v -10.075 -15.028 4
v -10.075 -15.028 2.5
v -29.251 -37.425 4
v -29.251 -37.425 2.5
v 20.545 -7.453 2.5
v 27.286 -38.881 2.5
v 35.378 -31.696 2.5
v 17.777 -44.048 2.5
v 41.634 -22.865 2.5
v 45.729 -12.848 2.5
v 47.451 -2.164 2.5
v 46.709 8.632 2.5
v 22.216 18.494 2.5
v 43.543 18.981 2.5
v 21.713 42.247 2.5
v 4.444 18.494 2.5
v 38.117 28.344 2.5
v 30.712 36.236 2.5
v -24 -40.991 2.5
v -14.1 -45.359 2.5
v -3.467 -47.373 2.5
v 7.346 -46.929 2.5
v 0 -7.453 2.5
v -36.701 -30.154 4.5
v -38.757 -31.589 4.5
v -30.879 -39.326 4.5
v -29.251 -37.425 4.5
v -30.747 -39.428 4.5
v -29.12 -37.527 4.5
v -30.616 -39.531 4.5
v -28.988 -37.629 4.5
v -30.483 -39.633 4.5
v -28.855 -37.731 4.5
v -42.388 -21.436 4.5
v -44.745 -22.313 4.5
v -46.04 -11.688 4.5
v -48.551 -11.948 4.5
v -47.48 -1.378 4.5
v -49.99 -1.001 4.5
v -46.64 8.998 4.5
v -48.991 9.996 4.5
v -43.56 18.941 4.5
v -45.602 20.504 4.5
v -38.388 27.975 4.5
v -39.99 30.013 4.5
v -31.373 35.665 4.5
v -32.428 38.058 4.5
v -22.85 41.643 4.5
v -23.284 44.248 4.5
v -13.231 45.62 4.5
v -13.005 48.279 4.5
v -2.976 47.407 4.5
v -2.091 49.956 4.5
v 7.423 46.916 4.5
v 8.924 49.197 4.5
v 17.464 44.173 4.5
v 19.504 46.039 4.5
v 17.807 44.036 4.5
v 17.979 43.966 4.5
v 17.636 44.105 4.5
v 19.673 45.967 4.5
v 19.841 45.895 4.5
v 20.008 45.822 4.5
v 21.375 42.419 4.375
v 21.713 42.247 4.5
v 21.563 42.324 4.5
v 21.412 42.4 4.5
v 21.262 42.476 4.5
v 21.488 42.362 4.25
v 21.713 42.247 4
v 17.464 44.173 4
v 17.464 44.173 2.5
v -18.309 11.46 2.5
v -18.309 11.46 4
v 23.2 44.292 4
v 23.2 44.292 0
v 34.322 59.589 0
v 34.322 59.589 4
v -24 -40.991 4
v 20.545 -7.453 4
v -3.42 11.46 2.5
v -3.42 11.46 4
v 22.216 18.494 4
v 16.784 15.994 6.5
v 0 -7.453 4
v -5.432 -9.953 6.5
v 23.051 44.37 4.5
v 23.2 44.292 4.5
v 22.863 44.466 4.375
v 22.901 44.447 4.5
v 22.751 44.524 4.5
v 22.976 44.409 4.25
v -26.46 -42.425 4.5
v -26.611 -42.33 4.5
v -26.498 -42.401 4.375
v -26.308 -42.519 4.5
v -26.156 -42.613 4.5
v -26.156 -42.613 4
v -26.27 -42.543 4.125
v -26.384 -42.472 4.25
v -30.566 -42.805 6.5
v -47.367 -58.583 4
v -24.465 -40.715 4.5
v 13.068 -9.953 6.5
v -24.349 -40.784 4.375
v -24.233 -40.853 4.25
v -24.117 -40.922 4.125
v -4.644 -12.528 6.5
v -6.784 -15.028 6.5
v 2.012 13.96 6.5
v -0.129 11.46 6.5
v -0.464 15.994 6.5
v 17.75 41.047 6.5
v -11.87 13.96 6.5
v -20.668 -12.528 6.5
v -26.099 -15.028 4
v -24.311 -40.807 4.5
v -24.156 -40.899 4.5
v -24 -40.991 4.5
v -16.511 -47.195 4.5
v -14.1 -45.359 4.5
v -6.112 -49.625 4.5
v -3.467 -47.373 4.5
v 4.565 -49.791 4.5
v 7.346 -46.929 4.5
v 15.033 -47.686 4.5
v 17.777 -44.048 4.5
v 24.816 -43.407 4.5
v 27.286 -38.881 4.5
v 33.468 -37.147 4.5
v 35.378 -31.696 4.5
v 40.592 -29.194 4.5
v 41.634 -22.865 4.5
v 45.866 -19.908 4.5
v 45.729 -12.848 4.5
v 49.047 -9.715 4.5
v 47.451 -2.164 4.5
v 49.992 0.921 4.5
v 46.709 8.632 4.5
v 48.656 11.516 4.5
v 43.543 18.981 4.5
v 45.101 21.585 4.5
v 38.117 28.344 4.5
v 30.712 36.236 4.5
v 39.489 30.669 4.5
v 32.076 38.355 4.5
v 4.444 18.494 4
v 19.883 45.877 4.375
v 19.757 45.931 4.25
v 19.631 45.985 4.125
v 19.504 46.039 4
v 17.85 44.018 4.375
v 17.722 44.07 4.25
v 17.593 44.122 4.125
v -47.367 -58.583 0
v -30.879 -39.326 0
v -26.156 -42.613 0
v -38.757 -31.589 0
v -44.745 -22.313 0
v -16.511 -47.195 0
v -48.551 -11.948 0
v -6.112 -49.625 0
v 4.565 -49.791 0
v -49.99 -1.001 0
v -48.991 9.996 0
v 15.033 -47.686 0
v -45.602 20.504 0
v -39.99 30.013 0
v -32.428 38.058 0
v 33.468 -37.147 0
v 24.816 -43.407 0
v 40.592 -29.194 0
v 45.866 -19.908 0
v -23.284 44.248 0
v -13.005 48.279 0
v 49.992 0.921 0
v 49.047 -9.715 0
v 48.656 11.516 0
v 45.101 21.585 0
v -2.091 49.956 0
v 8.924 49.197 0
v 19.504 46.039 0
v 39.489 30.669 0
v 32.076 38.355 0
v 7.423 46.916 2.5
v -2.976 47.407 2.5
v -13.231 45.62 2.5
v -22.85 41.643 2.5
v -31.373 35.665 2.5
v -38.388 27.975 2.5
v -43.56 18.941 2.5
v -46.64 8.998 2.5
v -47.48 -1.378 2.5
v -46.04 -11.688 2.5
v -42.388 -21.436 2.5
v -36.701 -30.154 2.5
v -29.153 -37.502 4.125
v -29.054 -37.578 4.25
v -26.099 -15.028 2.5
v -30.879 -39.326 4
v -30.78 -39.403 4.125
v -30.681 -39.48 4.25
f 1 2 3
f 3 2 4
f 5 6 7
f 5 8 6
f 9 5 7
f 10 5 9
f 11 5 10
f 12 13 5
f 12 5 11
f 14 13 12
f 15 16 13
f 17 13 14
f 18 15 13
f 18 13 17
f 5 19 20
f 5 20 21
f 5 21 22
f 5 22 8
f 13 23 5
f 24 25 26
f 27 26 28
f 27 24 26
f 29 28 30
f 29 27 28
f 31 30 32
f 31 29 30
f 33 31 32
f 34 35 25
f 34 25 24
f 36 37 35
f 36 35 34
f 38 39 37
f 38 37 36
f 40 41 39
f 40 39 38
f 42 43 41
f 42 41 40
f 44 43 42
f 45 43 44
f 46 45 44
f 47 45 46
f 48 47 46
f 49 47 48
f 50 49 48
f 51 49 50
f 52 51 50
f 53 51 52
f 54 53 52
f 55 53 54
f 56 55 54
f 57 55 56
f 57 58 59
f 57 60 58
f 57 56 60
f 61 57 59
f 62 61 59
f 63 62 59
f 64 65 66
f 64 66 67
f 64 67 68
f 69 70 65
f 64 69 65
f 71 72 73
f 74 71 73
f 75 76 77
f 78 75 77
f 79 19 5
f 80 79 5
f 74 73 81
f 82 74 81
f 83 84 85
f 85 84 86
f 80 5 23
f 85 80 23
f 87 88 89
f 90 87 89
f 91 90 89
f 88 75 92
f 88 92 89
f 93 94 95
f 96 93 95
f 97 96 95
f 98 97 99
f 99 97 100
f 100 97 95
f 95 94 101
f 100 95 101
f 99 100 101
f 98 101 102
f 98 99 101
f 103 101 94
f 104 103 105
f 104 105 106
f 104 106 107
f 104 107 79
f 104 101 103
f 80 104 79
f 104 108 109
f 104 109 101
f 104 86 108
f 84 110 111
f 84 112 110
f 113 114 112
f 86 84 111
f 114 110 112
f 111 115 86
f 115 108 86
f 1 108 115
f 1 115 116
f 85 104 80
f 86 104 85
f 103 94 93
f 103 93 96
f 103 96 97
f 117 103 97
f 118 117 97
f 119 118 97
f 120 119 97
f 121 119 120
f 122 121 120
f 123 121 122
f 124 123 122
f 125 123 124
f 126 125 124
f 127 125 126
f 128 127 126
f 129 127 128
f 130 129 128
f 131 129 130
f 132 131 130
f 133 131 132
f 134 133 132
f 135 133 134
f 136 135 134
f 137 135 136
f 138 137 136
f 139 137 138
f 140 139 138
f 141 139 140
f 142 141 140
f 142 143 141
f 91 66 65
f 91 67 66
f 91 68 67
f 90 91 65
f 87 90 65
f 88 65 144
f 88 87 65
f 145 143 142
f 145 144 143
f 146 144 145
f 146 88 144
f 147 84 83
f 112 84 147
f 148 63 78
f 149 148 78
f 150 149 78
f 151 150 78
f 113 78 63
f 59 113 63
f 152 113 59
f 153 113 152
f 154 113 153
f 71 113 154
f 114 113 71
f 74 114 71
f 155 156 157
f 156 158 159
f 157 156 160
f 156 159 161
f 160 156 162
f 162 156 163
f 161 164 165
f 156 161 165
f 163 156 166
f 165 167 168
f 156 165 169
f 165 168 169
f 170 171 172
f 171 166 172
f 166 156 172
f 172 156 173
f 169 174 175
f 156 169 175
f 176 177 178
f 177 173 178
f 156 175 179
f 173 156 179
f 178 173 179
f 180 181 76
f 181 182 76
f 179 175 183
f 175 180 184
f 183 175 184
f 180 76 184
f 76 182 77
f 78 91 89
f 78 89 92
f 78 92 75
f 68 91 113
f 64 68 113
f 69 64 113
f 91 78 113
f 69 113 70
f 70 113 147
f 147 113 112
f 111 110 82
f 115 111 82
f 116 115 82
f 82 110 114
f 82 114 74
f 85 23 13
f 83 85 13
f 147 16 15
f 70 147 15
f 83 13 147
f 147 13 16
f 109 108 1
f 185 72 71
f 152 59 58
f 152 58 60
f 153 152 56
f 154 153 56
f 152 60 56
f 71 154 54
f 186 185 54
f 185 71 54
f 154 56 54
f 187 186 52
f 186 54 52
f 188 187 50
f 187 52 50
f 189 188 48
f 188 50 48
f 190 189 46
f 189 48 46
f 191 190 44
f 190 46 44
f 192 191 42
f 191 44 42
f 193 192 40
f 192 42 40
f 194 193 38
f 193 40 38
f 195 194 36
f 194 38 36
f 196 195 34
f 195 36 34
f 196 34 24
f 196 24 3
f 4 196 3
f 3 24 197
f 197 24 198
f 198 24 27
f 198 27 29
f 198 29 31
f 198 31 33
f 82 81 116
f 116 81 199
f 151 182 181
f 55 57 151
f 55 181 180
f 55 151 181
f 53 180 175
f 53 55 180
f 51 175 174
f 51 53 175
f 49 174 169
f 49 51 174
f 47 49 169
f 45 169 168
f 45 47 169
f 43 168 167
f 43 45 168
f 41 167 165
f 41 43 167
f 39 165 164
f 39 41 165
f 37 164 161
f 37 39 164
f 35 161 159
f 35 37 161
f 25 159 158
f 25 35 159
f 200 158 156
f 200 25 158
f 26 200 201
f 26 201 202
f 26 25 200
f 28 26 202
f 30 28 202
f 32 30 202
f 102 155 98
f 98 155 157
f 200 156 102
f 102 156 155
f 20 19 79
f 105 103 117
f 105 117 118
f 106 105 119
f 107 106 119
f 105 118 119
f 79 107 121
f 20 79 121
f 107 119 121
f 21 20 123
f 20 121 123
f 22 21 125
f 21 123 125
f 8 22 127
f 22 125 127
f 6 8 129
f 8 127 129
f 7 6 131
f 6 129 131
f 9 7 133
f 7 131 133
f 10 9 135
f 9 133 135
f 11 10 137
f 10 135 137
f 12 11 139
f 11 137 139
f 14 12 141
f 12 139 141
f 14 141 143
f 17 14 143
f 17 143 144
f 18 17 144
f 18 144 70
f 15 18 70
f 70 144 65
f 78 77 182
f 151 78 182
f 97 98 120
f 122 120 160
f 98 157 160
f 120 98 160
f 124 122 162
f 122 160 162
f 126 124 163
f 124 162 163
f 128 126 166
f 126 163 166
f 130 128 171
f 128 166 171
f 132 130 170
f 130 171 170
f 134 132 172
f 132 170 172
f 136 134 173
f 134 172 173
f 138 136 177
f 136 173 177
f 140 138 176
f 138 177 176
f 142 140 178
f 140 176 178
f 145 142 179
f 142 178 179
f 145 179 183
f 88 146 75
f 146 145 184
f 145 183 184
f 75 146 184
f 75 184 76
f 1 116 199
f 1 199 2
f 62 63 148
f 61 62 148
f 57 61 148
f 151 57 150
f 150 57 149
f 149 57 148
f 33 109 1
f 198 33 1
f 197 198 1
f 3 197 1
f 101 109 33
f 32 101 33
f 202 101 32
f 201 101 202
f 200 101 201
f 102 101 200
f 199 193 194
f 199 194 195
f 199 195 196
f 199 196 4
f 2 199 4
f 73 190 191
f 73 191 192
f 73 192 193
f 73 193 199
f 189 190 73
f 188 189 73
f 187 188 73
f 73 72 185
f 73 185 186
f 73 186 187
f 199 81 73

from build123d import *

# Parameters (mm, degrees)
F0_R          = 47.5
F1_DEPTH      = 2.5
F0_R_2        = 50
F2_DEPTH      = 4.5
F4_DEPTH      = 2.5
F5_DEPTH      = 2.5
F6_DEPTH      = 2.5
F7_DEPTH      = 2.5
F8_DEPTH      = 2.5
F9_DEPTH      = 1.5
F10_T4_DEPTH  = 97.8665217368
F10_S5_R      = 47.5
F10_T6_DEPTH  = 52
F10_T11_DEPTH = 97.8665217368
F10_S12_R     = 47.5
F10_T13_DEPTH = 52
F10_T18_DEPTH = 97.8665217368
F10_S19_R     = 47.5
F10_T20_DEPTH = 52
F10_S22_R     = 50
F10_T23_DEPTH = 52
F10_T27_DEPTH = 97.8665217368
F10_S29_R     = 50
F10_T30_DEPTH = 52
F10_T34_DEPTH = 97.8665217368
F10_S36_R     = 50
F10_T37_DEPTH = 52
F11_T4_DEPTH  = 71.4627253186
F11_S6_R      = 50
F11_T7_DEPTH  = 38
F11_T11_DEPTH = 71.4627253186
F11_S13_R     = 50
F11_T14_DEPTH = 38
F11_T18_DEPTH = 71.4627253186
F11_S19_R     = 47.5
F11_T20_DEPTH = 38
F11_S22_R     = 50
F11_T23_DEPTH = 38
F11_T27_DEPTH = 71.4627253186
F11_S29_R     = 47.5
F11_T30_DEPTH = 38
F11_T35_DEPTH = 71.4627253186
F11_S37_R     = 47.5
F11_T38_DEPTH = 38
F12_SIZE      = 2.5
F13_T4_DEPTH  = 32.1736802215
F13_T9_DEPTH  = 32.1736802215
F14_SIZE      = 2.5
F15_SIZE      = 2.5
F16_T1_DEPTH  = 21.3180204906
F16_T6_DEPTH  = 9.7203833333
F17_SIZE      = 2.5
F18_T4_DEPTH  = 80.4724206
F18_S5_R      = 47.5
F18_T6_DEPTH  = 43
F18_T11_DEPTH = 80.4724206
F18_S12_R     = 47.5
F18_T13_DEPTH = 43
F18_T18_DEPTH = 80.4724206
F18_S19_R     = 50
F18_T20_DEPTH = 43
F18_S21_R     = 47.5
F18_T22_DEPTH = 43
F18_T27_DEPTH = 80.4724206
F18_S28_R     = 50
F18_T29_DEPTH = 43
F18_T34_DEPTH = 80.4724206
F18_S35_R     = 50
F18_T36_DEPTH = 43
F19_T4_DEPTH  = 67.1181390524
F19_S5_R      = 47.5
F19_T6_DEPTH  = 36
F19_T11_DEPTH = 67.1181390524
F19_T17_DEPTH = 67.1181390524
F19_S18_R     = 50
F19_T19_DEPTH = 36


# Not quite as in the source:
# - a fillet or chamfer that OpenCascade refuses, or shapes differently, is made with other operations: its cross-section is extruded or revolved along the edge and cut away or added


with BuildPart() as f1:
    # F0 (on Top) → F1 (new body)
    with BuildSketch(Plane.XY):
        Circle(F0_R)
    extrude(amount=F1_DEPTH)

    # F0 (on Top) → F2 (join)
    with BuildSketch(Plane.XY):
        Circle(F0_R_2)
        Circle(F0_R, mode=Mode.SUBTRACT)
    extrude(amount=F2_DEPTH)

    # F3 (on face) → F4 (join)
    with BuildSketch(Plane.XY.offset(2.5)):
        with BuildLine():
            ThreePointArc((21.7132493209, 42.2467135281), (19.6123250887, 43.2620700454), (17.4640719677, 44.173025596))
            Line((17.4640719677, 44.173025596), (-18.3086600155, 11.4598022774))
            Line((-18.3086600155, 11.4598022774), (-3.4198469948, 11.4598022774))
            Line((-3.4198469948, 11.4598022774), (-26.0993205011, -15.0284366682))
            Line((-26.0993205011, -15.0284366682), (-10.0752310827, -15.0284366682))
            Line((-10.0752310827, -15.0284366682), (-29.2512131204, -37.4248117027))
            ThreePointArc((-29.2512131204, -37.4248117027), (-26.6854575008, -39.29550048), (-24.0004517017, -40.990588165))
            Line((-24.0004517017, -40.990588165), (20.5448437482, -7.452824153))
            Line((20.5448437482, -7.452824153), (0, -7.452824153))
            Line((0, -7.452824153), (22.2159207014, 18.4940134476))
            Line((22.2159207014, 18.4940134476), (4.4441488571, 18.4940134476))
            Line((4.4441488571, 18.4940134476), (21.7132493209, 42.2467135281))
        make_face()
    extrude(amount=F4_DEPTH)

    # F3 (on face) → F5 (join)
    with BuildSketch(Plane.XY.offset(2.5)):
        with BuildLine():
            ThreePointArc((-24.0004517017, -40.990588165), (-26.6854575008, -39.29550048), (-29.2512131204, -37.4248117027))
            Line((-29.2512131204, -37.4248117027), (-47.3672765296, -58.5832665585))
            Line((-47.3672765296, -58.5832665585), (-24.0004517017, -40.990588165))
        make_face()
    extrude(amount=F5_DEPTH)

    # F3 (on face) → F6 (join)
    with BuildSketch(Plane.XY.offset(2.5)):
        with BuildLine():
            Line((21.7132493209, 42.2467135281), (34.321565181, 59.5887601376))
            Line((34.321565181, 59.5887601376), (17.4640719677, 44.173025596))
            ThreePointArc((17.4640719677, 44.173025596), (19.6123250887, 43.2620700454), (21.7132493209, 42.2467135281))
        make_face()
    extrude(amount=F6_DEPTH)

    # F3 (on face) → F7 (join)
    with BuildSketch(Plane.XY.offset(2.5)):
        with BuildLine():
            ThreePointArc((-24.0004517017, -40.990588165), (-26.6854575008, -39.29550048), (-29.2512131204, -37.4248117027))
            Line((-29.2512131204, -37.4248117027), (-47.3672765296, -58.5832665585))
            Line((-47.3672765296, -58.5832665585), (-24.0004517017, -40.990588165))
        make_face()
    extrude(amount=-F7_DEPTH)

    # F3 (on face) → F8 (join)
    with BuildSketch(Plane.XY.offset(2.5)):
        with BuildLine():
            Line((21.7132493209, 42.2467135281), (34.321565181, 59.5887601376))
            Line((34.321565181, 59.5887601376), (17.4640719677, 44.173025596))
            ThreePointArc((17.4640719677, 44.173025596), (19.6123250887, 43.2620700454), (21.7132493209, 42.2467135281))
        make_face()
    extrude(amount=-F8_DEPTH)

    # F9 (add): a face of the model
    f9_faces = [f1.faces().sort_by_distance(p)[0] for p in [
        (-3.1603414311, -1.3488112802, 5),
    ]]
    extrude(f9_faces, amount=F9_DEPTH)

    # F10: chamfer of 2.5 on 1 edges, made by hand


with BuildPart() as f10_tool2:
    # F10_s3 → F10_t4 (new body)
    with BuildSketch(Plane(origin=(14.6672771585, 11.0428649103, 0), x_dir=(0, 0, 1), z_dir=(-0.7988899275, -0.6014772512, 0))):
        Polygon((6.5, -15.8112422913), (4, -18.3112422913), (6.5, -18.3112422913), align=None)
    extrude(amount=F10_T4_DEPTH)

    # F10_s5 → F10_t6 (intersect, symmetric)
    with BuildSketch(Plane.XY.offset(5.2)):
        Circle(F10_S5_R)
    extrude(amount=F10_T6_DEPTH, both=True, mode=Mode.INTERSECT)

    split(bisect_by=Plane.XY.offset(4.5), keep=Keep.TOP)


with BuildPart() as f1_1:
    add(f1.part)

    # F10_t1: cut F10_tool2
    add(f10_tool2.part, mode=Mode.SUBTRACT)


with BuildPart() as f10_tool9:
    # F10_s10 → F10_t11 (new body)
    with BuildSketch(Plane(origin=(14.6672771585, 11.0428649103, 0), x_dir=(0, 0, 1), z_dir=(-0.7988899275, -0.6014772512, 0))):
        Polygon((6.5, -15.8112422913), (4, -18.3112422913), (6.5, -18.3112422913), align=None)
    extrude(amount=F10_T11_DEPTH)

    # F10_s12 → F10_t13 (intersect, symmetric)
    with BuildSketch(Plane.XY.offset(5.2)):
        Circle(F10_S12_R)
    extrude(amount=F10_T13_DEPTH, both=True, mode=Mode.INTERSECT)

    split(bisect_by=Plane.XY.offset(4.5), keep=Keep.BOTTOM)


with BuildPart() as f1_2:
    add(f1_1.part)

    # F10_t8: cut F10_tool9
    add(f10_tool9.part, mode=Mode.SUBTRACT)


with BuildPart() as f10_tool16:
    # F10_s17 → F10_t18 (new body)
    with BuildSketch(Plane(origin=(14.6672771585, 11.0428649103, 0), x_dir=(0, 0, 1), z_dir=(-0.7988899275, -0.6014772512, 0))):
        Polygon((6.5, -15.8112422913), (4, -18.3112422913), (6.5, -18.3112422913), align=None)
    extrude(amount=F10_T18_DEPTH)

    # F10_s19 → F10_t20 (cut, symmetric)
    with BuildSketch(Plane.XY.offset(5.2)):
        Circle(F10_S19_R)
    extrude(amount=F10_T20_DEPTH, both=True, mode=Mode.SUBTRACT)

    split(bisect_by=Plane.XY.offset(4.5), keep=Keep.TOP)

    # F10_s22 → F10_t23 (intersect, symmetric)
    with BuildSketch(Plane.XY.offset(5.2)):
        Circle(F10_S22_R)
    extrude(amount=F10_T23_DEPTH, both=True, mode=Mode.INTERSECT)


with BuildPart() as f1_3:
    add(f1_2.part)

    # F10_t15: cut F10_tool16
    add(f10_tool16.part, mode=Mode.SUBTRACT)


with BuildPart() as f10_tool25:
    # F10_s26 → F10_t27 (new body)
    with BuildSketch(Plane(origin=(14.6672771585, 11.0428649103, 0), x_dir=(0, 0, 1), z_dir=(-0.7988899275, -0.6014772512, 0))):
        Polygon((6.5, -15.8112422913), (4, -18.3112422913), (6.5, -18.3112422913), align=None)
    extrude(amount=F10_T27_DEPTH)

    split(bisect_by=Plane.XY.offset(4.5), keep=Keep.TOP)

    # F10_s29 → F10_t30 (cut, symmetric)
    with BuildSketch(Plane.XY.offset(5.2)):
        Circle(F10_S29_R)
    extrude(amount=F10_T30_DEPTH, both=True, mode=Mode.SUBTRACT)


with BuildPart() as f1_4:
    add(f1_3.part)

    # F10_t24: cut F10_tool25
    add(f10_tool25.part, mode=Mode.SUBTRACT)


with BuildPart() as f10_tool32:
    # F10_s33 → F10_t34 (new body)
    with BuildSketch(Plane(origin=(14.6672771585, 11.0428649103, 0), x_dir=(0, 0, 1), z_dir=(-0.7988899275, -0.6014772512, 0))):
        Polygon((6.5, -15.8112422913), (4, -18.3112422913), (6.5, -18.3112422913), align=None)
    extrude(amount=F10_T34_DEPTH)

    split(bisect_by=Plane.XY.offset(4.5), keep=Keep.BOTTOM)

    # F10_s36 → F10_t37 (cut, symmetric)
    with BuildSketch(Plane.XY.offset(5.2)):
        Circle(F10_S36_R)
    extrude(amount=F10_T37_DEPTH, both=True, mode=Mode.SUBTRACT)


with BuildPart() as f1_5:
    add(f1_4.part)

    # F10_t31: cut F10_tool32
    add(f10_tool32.part, mode=Mode.SUBTRACT)

    # F11: chamfer of 2.5 on 1 edges, made by hand


with BuildPart() as f11_tool2:
    # F11_s3 → F11_t4 (new body)
    with BuildSketch(Plane(origin=(-53.9830269669, -63.0488761968, 0), x_dir=(0, 0, 1), z_dir=(0.6503824329, 0.7596069319, 0))):
        Polygon((6.5, 4.6210158312), (4, 2.1210158312), (6.5, 2.1210158312), align=None)
    extrude(amount=F11_T4_DEPTH)

    split(bisect_by=Plane.XY.offset(4.5), keep=Keep.TOP)

    # F11_s6 → F11_t7 (cut, symmetric)
    with BuildSketch(Plane.XY.offset(5.2)):
        Circle(F11_S6_R)
    extrude(amount=F11_T7_DEPTH, both=True, mode=Mode.SUBTRACT)


with BuildPart() as f1_6:
    add(f1_5.part)

    # F11_t1: cut F11_tool2
    add(f11_tool2.part, mode=Mode.SUBTRACT)


with BuildPart() as f11_tool9:
    # F11_s10 → F11_t11 (new body)
    with BuildSketch(Plane(origin=(-53.9830269669, -63.0488761968, 0), x_dir=(0, 0, 1), z_dir=(0.6503824329, 0.7596069319, 0))):
        Polygon((6.5, 4.6210158312), (4, 2.1210158312), (6.5, 2.1210158312), align=None)
    extrude(amount=F11_T11_DEPTH)

    split(bisect_by=Plane.XY.offset(4.5), keep=Keep.BOTTOM)

    # F11_s13 → F11_t14 (cut, symmetric)
    with BuildSketch(Plane.XY.offset(5.2)):
        Circle(F11_S13_R)
    extrude(amount=F11_T14_DEPTH, both=True, mode=Mode.SUBTRACT)


with BuildPart() as f1_7:
    add(f1_6.part)

    # F11_t8: cut F11_tool9
    add(f11_tool9.part, mode=Mode.SUBTRACT)


with BuildPart() as f11_tool16:
    # F11_s17 → F11_t18 (new body)
    with BuildSketch(Plane(origin=(-53.9830269669, -63.0488761968, 0), x_dir=(0, 0, 1), z_dir=(0.6503824329, 0.7596069319, 0))):
        Polygon((6.5, 4.6210158312), (4, 2.1210158312), (6.5, 2.1210158312), align=None)
    extrude(amount=F11_T18_DEPTH)

    # F11_s19 → F11_t20 (cut, symmetric)
    with BuildSketch(Plane.XY.offset(5.2)):
        Circle(F11_S19_R)
    extrude(amount=F11_T20_DEPTH, both=True, mode=Mode.SUBTRACT)

    split(bisect_by=Plane.XY.offset(4.5), keep=Keep.TOP)

    # F11_s22 → F11_t23 (intersect, symmetric)
    with BuildSketch(Plane.XY.offset(5.2)):
        Circle(F11_S22_R)
    extrude(amount=F11_T23_DEPTH, both=True, mode=Mode.INTERSECT)


with BuildPart() as f1_8:
    add(f1_7.part)

    # F11_t15: cut F11_tool16
    add(f11_tool16.part, mode=Mode.SUBTRACT)


with BuildPart() as f11_tool25:
    # F11_s26 → F11_t27 (new body)
    with BuildSketch(Plane(origin=(-53.9830269669, -63.0488761968, 0), x_dir=(0, 0, 1), z_dir=(0.6503824329, 0.7596069319, 0))):
        Polygon((6.5, 4.6210158312), (4, 2.1210158312), (6.5, 2.1210158312), align=None)
    extrude(amount=F11_T27_DEPTH)

    split(bisect_by=Plane.XZ.offset(15.0284366682), keep=Keep.TOP)

    # F11_s29 → F11_t30 (intersect, symmetric)
    with BuildSketch(Plane.XY.offset(5.2)):
        Circle(F11_S29_R)
    extrude(amount=F11_T30_DEPTH, both=True, mode=Mode.INTERSECT)

    split(bisect_by=Plane.XY.offset(4.5), keep=Keep.TOP)


with BuildPart() as f1_9:
    add(f1_8.part)

    # F11_t24: cut F11_tool25
    add(f11_tool25.part, mode=Mode.SUBTRACT)


with BuildPart() as f11_tool33:
    # F11_s34 → F11_t35 (new body)
    with BuildSketch(Plane(origin=(-53.9830269669, -63.0488761968, 0), x_dir=(0, 0, 1), z_dir=(0.6503824329, 0.7596069319, 0))):
        Polygon((6.5, 4.6210158312), (4, 2.1210158312), (6.5, 2.1210158312), align=None)
    extrude(amount=F11_T35_DEPTH)

    split(bisect_by=Plane.XZ.offset(15.0284366682), keep=Keep.TOP)

    # F11_s37 → F11_t38 (intersect, symmetric)
    with BuildSketch(Plane.XY.offset(5.2)):
        Circle(F11_S37_R)
    extrude(amount=F11_T38_DEPTH, both=True, mode=Mode.INTERSECT)

    split(bisect_by=Plane.XY.offset(4.5), keep=Keep.BOTTOM)


with BuildPart() as f1_10:
    add(f1_9.part)

    # F11_t32: cut F11_tool33
    add(f11_tool33.part, mode=Mode.SUBTRACT)

    # F12
    f12_edges = [f1_10.edges().sort_by_distance(p)[0] for p in [
        (8.194205, -7.452824, 6.5),
    ]]
    chamfer(f12_edges, length=F12_SIZE)

    # F13: chamfer of 2.5 on 1 edges, made by hand


with BuildPart() as f13_tool2:
    # F13_s3 → F13_t4 (new body)
    with BuildSketch(Plane.YZ.offset(-32.528527971)):
        Polygon((-12.5284366682, 6.5), (-15.0284366682, 4), (-15.0284366682, 6.5), align=None)
    extrude(amount=F13_T4_DEPTH)

    split(bisect_by=Plane(origin=(1.6111383281, -1.3794714365, 0), x_dir=(0, 0, 1), z_dir=(-0.7596069319, 0.6503824329, 0)), keep=Keep.TOP)


with BuildPart() as f1_11:
    add(f1_10.part)

    # F13_t1: cut F13_tool2
    add(f13_tool2.part, mode=Mode.SUBTRACT)


with BuildPart() as f13_tool7:
    # F13_s8 → F13_t9 (new body)
    with BuildSketch(Plane.YZ.offset(-32.528527971)):
        Polygon((-12.5284366682, 6.5), (-15.0284366682, 4), (-15.0284366682, 6.5), align=None)
    extrude(amount=F13_T9_DEPTH)

    split(bisect_by=Plane(origin=(-0.7136446998, 0.6110291475, 0.9394920844), x_dir=(-0.6503824329, -0.7596069319, 0), z_dir=(-0.5371232126, 0.4598898286, 0.7071067812)), keep=Keep.TOP)

    split(bisect_by=Plane(origin=(1.6111383281, -1.3794714365, 0), x_dir=(0, 0, 1), z_dir=(0.7596069319, -0.6503824329, 0)), keep=Keep.TOP)


with BuildPart() as f1_12:
    add(f1_11.part)

    # F13_t6: cut F13_tool7
    add(f13_tool7.part, mode=Mode.SUBTRACT)

    # F14
    f14_edges = [f1_12.edges().sort_by_distance(p)[0] for p in [
        (-13.689322, -0.534317, 6.5),
    ]]
    chamfer(f14_edges, length=F14_SIZE)

    # F15
    f15_edges = [f1_12.edges().sort_by_distance(p)[0] for p in [
        (10.037699, 4.270595, 6.5),
    ]]
    chamfer(f15_edges, length=F15_SIZE)

    # F16: chamfer of 2.5 on 1 edges, made by hand

    # F16_s2 → F16_t1 (cut)
    with BuildSketch(Plane.YZ.offset(-24.7378674854)):
        Polygon((13.9598022774, 6.5), (11.4598022774, 4), (11.4598022774, 6.5), align=None)
    extrude(amount=F16_T1_DEPTH, mode=Mode.SUBTRACT)


with BuildPart() as f16_tool4:
    # F16_s5 → F16_t6 (new body)
    with BuildSketch(Plane.YZ.offset(-3.4198469948)):
        Polygon((13.9598022774, 6.5), (11.4598022774, 4), (11.4598022774, 6.5), align=None)
    extrude(amount=F16_T6_DEPTH)

    split(bisect_by=Plane(origin=(-5.3366160576, 4.5692596907, 7.0254967843), x_dir=(-0.6503824329, -0.7596069319, 0), z_dir=(-0.5371232126, 0.4598898286, 0.7071067812)), keep=Keep.TOP)


with BuildPart() as f1_13:
    add(f1_12.part)

    # F16_t3: cut F16_tool4
    add(f16_tool4.part, mode=Mode.SUBTRACT)

    # F17
    f17_edges = [f1_13.edges().sort_by_distance(p)[0] for p in [
        (11.684447, 18.494013, 6.5),
    ]]
    chamfer(f17_edges, length=F17_SIZE)

    # F18: chamfer of 2.5 on 1 edges, made by hand


with BuildPart() as f18_tool2:
    # F18_s3 → F18_t4 (new body)
    with BuildSketch(Plane(origin=(-6.2742203903, -5.7376096652, 0), x_dir=(0, 0, 1), z_dir=(0.7379597151, 0.6748447665, 0))):
        Polygon((6.5, -18.3123758167), (4, -20.8123758167), (6.5, -20.8123758167), align=None)
    extrude(amount=F18_T4_DEPTH)

    # F18_s5 → F18_t6 (intersect, symmetric)
    with BuildSketch(Plane.XY.offset(5.2)):
        Circle(F18_S5_R)
    extrude(amount=F18_T6_DEPTH, both=True, mode=Mode.INTERSECT)

    split(bisect_by=Plane.XY.offset(4.5), keep=Keep.TOP)


with BuildPart() as f1_14:
    add(f1_13.part)

    # F18_t1: cut F18_tool2
    add(f18_tool2.part, mode=Mode.SUBTRACT)


with BuildPart() as f18_tool9:
    # F18_s10 → F18_t11 (new body)
    with BuildSketch(Plane(origin=(-6.2742203903, -5.7376096652, 0), x_dir=(0, 0, 1), z_dir=(0.7379597151, 0.6748447665, 0))):
        Polygon((6.5, -18.3123758167), (4, -20.8123758167), (6.5, -20.8123758167), align=None)
    extrude(amount=F18_T11_DEPTH)

    # F18_s12 → F18_t13 (intersect, symmetric)
    with BuildSketch(Plane.XY.offset(5.2)):
        Circle(F18_S12_R)
    extrude(amount=F18_T13_DEPTH, both=True, mode=Mode.INTERSECT)

    split(bisect_by=Plane.XY.offset(4.5), keep=Keep.BOTTOM)


with BuildPart() as f1_15:
    add(f1_14.part)

    # F18_t8: cut F18_tool9
    add(f18_tool9.part, mode=Mode.SUBTRACT)


with BuildPart() as f18_tool16:
    # F18_s17 → F18_t18 (new body)
    with BuildSketch(Plane(origin=(-6.2742203903, -5.7376096652, 0), x_dir=(0, 0, 1), z_dir=(0.7379597151, 0.6748447665, 0))):
        Polygon((6.5, -18.3123758167), (4, -20.8123758167), (6.5, -20.8123758167), align=None)
    extrude(amount=F18_T18_DEPTH)

    # F18_s19 → F18_t20 (intersect, symmetric)
    with BuildSketch(Plane.XY.offset(5.2)):
        Circle(F18_S19_R)
    extrude(amount=F18_T20_DEPTH, both=True, mode=Mode.INTERSECT)

    # F18_s21 → F18_t22 (cut, symmetric)
    with BuildSketch(Plane.XY.offset(5.2)):
        Circle(F18_S21_R)
    extrude(amount=F18_T22_DEPTH, both=True, mode=Mode.SUBTRACT)

    split(bisect_by=Plane.XY.offset(4.5), keep=Keep.TOP)


with BuildPart() as f1_16:
    add(f1_15.part)

    # F18_t15: cut F18_tool16
    add(f18_tool16.part, mode=Mode.SUBTRACT)


with BuildPart() as f18_tool25:
    # F18_s26 → F18_t27 (new body)
    with BuildSketch(Plane(origin=(-6.2742203903, -5.7376096652, 0), x_dir=(0, 0, 1), z_dir=(0.7379597151, 0.6748447665, 0))):
        Polygon((6.5, -18.3123758167), (4, -20.8123758167), (6.5, -20.8123758167), align=None)
    extrude(amount=F18_T27_DEPTH)

    # F18_s28 → F18_t29 (cut, symmetric)
    with BuildSketch(Plane.XY.offset(5.2)):
        Circle(F18_S28_R)
    extrude(amount=F18_T29_DEPTH, both=True, mode=Mode.SUBTRACT)

    split(bisect_by=Plane.XY.offset(4.5), keep=Keep.TOP)


with BuildPart() as f1_17:
    add(f1_16.part)

    # F18_t24: cut F18_tool25
    add(f18_tool25.part, mode=Mode.SUBTRACT)


with BuildPart() as f18_tool32:
    # F18_s33 → F18_t34 (new body)
    with BuildSketch(Plane(origin=(-6.2742203903, -5.7376096652, 0), x_dir=(0, 0, 1), z_dir=(0.7379597151, 0.6748447665, 0))):
        Polygon((6.5, -18.3123758167), (4, -20.8123758167), (6.5, -20.8123758167), align=None)
    extrude(amount=F18_T34_DEPTH)

    # F18_s35 → F18_t36 (cut, symmetric)
    with BuildSketch(Plane.XY.offset(5.2)):
        Circle(F18_S35_R)
    extrude(amount=F18_T36_DEPTH, both=True, mode=Mode.SUBTRACT)

    split(bisect_by=Plane.XY.offset(4.5), keep=Keep.BOTTOM)


with BuildPart() as f1_18:
    add(f1_17.part)

    # F18_t31: cut F18_tool32
    add(f18_tool32.part, mode=Mode.SUBTRACT)

    # F19: chamfer of 2.5 on 1 edges, made by hand


with BuildPart() as f19_tool2:
    # F19_s3 → F19_t4 (new body)
    with BuildSketch(Plane(origin=(4.73478831, 6.5124415083, 0), x_dir=(0, 0, 1), z_dir=(0.5880471799, 0.808826628, 0))):
        Polygon((6.5, -9.7808065182), (4, -7.2808065182), (6.5, -7.2808065182), align=None)
    extrude(amount=F19_T4_DEPTH)

    # F19_s5 → F19_t6 (intersect, symmetric)
    with BuildSketch(Plane.XY.offset(5.2)):
        Circle(F19_S5_R)
    extrude(amount=F19_T6_DEPTH, both=True, mode=Mode.INTERSECT)

    split(bisect_by=Plane(origin=(0, 11.2470067238, 11.2470067238), x_dir=(1, 0, 0), z_dir=(0, 0.7071067812, 0.7071067812)), keep=Keep.TOP)


with BuildPart() as f1_19:
    add(f1_18.part)

    # F19_t1: cut F19_tool2
    add(f19_tool2.part, mode=Mode.SUBTRACT)


with BuildPart() as f19_tool9:
    # F19_s10 → F19_t11 (new body)
    with BuildSketch(Plane(origin=(4.73478831, 6.5124415083, 0), x_dir=(0, 0, 1), z_dir=(0.5880471799, 0.808826628, 0))):
        Polygon((6.5, -9.7808065182), (4, -7.2808065182), (6.5, -7.2808065182), align=None)
    extrude(amount=F19_T11_DEPTH)

    split(bisect_by=Plane.XY.offset(4.5), keep=Keep.TOP)

    split(bisect_by=Plane(origin=(0, 11.2470067238, 11.2470067238), x_dir=(1, 0, 0), z_dir=(0, 0.7071067812, 0.7071067812)), keep=Keep.TOP)


with BuildPart() as f1_20:
    add(f1_19.part)

    # F19_t8: cut F19_tool9
    add(f19_tool9.part, mode=Mode.SUBTRACT)


with BuildPart() as f19_tool15:
    # F19_s16 → F19_t17 (new body)
    with BuildSketch(Plane(origin=(4.73478831, 6.5124415083, 0), x_dir=(0, 0, 1), z_dir=(0.5880471799, 0.808826628, 0))):
        Polygon((6.5, -9.7808065182), (4, -7.2808065182), (6.5, -7.2808065182), align=None)
    extrude(amount=F19_T17_DEPTH)

    # F19_s18 → F19_t19 (cut, symmetric)
    with BuildSketch(Plane.XY.offset(5.2)):
        Circle(F19_S18_R)
    extrude(amount=F19_T19_DEPTH, both=True, mode=Mode.SUBTRACT)


with BuildPart() as f1_21:
    add(f1_20.part)

    # F19_t14: cut F19_tool15
    add(f19_tool15.part, mode=Mode.SUBTRACT)


solid = f1_21.part
